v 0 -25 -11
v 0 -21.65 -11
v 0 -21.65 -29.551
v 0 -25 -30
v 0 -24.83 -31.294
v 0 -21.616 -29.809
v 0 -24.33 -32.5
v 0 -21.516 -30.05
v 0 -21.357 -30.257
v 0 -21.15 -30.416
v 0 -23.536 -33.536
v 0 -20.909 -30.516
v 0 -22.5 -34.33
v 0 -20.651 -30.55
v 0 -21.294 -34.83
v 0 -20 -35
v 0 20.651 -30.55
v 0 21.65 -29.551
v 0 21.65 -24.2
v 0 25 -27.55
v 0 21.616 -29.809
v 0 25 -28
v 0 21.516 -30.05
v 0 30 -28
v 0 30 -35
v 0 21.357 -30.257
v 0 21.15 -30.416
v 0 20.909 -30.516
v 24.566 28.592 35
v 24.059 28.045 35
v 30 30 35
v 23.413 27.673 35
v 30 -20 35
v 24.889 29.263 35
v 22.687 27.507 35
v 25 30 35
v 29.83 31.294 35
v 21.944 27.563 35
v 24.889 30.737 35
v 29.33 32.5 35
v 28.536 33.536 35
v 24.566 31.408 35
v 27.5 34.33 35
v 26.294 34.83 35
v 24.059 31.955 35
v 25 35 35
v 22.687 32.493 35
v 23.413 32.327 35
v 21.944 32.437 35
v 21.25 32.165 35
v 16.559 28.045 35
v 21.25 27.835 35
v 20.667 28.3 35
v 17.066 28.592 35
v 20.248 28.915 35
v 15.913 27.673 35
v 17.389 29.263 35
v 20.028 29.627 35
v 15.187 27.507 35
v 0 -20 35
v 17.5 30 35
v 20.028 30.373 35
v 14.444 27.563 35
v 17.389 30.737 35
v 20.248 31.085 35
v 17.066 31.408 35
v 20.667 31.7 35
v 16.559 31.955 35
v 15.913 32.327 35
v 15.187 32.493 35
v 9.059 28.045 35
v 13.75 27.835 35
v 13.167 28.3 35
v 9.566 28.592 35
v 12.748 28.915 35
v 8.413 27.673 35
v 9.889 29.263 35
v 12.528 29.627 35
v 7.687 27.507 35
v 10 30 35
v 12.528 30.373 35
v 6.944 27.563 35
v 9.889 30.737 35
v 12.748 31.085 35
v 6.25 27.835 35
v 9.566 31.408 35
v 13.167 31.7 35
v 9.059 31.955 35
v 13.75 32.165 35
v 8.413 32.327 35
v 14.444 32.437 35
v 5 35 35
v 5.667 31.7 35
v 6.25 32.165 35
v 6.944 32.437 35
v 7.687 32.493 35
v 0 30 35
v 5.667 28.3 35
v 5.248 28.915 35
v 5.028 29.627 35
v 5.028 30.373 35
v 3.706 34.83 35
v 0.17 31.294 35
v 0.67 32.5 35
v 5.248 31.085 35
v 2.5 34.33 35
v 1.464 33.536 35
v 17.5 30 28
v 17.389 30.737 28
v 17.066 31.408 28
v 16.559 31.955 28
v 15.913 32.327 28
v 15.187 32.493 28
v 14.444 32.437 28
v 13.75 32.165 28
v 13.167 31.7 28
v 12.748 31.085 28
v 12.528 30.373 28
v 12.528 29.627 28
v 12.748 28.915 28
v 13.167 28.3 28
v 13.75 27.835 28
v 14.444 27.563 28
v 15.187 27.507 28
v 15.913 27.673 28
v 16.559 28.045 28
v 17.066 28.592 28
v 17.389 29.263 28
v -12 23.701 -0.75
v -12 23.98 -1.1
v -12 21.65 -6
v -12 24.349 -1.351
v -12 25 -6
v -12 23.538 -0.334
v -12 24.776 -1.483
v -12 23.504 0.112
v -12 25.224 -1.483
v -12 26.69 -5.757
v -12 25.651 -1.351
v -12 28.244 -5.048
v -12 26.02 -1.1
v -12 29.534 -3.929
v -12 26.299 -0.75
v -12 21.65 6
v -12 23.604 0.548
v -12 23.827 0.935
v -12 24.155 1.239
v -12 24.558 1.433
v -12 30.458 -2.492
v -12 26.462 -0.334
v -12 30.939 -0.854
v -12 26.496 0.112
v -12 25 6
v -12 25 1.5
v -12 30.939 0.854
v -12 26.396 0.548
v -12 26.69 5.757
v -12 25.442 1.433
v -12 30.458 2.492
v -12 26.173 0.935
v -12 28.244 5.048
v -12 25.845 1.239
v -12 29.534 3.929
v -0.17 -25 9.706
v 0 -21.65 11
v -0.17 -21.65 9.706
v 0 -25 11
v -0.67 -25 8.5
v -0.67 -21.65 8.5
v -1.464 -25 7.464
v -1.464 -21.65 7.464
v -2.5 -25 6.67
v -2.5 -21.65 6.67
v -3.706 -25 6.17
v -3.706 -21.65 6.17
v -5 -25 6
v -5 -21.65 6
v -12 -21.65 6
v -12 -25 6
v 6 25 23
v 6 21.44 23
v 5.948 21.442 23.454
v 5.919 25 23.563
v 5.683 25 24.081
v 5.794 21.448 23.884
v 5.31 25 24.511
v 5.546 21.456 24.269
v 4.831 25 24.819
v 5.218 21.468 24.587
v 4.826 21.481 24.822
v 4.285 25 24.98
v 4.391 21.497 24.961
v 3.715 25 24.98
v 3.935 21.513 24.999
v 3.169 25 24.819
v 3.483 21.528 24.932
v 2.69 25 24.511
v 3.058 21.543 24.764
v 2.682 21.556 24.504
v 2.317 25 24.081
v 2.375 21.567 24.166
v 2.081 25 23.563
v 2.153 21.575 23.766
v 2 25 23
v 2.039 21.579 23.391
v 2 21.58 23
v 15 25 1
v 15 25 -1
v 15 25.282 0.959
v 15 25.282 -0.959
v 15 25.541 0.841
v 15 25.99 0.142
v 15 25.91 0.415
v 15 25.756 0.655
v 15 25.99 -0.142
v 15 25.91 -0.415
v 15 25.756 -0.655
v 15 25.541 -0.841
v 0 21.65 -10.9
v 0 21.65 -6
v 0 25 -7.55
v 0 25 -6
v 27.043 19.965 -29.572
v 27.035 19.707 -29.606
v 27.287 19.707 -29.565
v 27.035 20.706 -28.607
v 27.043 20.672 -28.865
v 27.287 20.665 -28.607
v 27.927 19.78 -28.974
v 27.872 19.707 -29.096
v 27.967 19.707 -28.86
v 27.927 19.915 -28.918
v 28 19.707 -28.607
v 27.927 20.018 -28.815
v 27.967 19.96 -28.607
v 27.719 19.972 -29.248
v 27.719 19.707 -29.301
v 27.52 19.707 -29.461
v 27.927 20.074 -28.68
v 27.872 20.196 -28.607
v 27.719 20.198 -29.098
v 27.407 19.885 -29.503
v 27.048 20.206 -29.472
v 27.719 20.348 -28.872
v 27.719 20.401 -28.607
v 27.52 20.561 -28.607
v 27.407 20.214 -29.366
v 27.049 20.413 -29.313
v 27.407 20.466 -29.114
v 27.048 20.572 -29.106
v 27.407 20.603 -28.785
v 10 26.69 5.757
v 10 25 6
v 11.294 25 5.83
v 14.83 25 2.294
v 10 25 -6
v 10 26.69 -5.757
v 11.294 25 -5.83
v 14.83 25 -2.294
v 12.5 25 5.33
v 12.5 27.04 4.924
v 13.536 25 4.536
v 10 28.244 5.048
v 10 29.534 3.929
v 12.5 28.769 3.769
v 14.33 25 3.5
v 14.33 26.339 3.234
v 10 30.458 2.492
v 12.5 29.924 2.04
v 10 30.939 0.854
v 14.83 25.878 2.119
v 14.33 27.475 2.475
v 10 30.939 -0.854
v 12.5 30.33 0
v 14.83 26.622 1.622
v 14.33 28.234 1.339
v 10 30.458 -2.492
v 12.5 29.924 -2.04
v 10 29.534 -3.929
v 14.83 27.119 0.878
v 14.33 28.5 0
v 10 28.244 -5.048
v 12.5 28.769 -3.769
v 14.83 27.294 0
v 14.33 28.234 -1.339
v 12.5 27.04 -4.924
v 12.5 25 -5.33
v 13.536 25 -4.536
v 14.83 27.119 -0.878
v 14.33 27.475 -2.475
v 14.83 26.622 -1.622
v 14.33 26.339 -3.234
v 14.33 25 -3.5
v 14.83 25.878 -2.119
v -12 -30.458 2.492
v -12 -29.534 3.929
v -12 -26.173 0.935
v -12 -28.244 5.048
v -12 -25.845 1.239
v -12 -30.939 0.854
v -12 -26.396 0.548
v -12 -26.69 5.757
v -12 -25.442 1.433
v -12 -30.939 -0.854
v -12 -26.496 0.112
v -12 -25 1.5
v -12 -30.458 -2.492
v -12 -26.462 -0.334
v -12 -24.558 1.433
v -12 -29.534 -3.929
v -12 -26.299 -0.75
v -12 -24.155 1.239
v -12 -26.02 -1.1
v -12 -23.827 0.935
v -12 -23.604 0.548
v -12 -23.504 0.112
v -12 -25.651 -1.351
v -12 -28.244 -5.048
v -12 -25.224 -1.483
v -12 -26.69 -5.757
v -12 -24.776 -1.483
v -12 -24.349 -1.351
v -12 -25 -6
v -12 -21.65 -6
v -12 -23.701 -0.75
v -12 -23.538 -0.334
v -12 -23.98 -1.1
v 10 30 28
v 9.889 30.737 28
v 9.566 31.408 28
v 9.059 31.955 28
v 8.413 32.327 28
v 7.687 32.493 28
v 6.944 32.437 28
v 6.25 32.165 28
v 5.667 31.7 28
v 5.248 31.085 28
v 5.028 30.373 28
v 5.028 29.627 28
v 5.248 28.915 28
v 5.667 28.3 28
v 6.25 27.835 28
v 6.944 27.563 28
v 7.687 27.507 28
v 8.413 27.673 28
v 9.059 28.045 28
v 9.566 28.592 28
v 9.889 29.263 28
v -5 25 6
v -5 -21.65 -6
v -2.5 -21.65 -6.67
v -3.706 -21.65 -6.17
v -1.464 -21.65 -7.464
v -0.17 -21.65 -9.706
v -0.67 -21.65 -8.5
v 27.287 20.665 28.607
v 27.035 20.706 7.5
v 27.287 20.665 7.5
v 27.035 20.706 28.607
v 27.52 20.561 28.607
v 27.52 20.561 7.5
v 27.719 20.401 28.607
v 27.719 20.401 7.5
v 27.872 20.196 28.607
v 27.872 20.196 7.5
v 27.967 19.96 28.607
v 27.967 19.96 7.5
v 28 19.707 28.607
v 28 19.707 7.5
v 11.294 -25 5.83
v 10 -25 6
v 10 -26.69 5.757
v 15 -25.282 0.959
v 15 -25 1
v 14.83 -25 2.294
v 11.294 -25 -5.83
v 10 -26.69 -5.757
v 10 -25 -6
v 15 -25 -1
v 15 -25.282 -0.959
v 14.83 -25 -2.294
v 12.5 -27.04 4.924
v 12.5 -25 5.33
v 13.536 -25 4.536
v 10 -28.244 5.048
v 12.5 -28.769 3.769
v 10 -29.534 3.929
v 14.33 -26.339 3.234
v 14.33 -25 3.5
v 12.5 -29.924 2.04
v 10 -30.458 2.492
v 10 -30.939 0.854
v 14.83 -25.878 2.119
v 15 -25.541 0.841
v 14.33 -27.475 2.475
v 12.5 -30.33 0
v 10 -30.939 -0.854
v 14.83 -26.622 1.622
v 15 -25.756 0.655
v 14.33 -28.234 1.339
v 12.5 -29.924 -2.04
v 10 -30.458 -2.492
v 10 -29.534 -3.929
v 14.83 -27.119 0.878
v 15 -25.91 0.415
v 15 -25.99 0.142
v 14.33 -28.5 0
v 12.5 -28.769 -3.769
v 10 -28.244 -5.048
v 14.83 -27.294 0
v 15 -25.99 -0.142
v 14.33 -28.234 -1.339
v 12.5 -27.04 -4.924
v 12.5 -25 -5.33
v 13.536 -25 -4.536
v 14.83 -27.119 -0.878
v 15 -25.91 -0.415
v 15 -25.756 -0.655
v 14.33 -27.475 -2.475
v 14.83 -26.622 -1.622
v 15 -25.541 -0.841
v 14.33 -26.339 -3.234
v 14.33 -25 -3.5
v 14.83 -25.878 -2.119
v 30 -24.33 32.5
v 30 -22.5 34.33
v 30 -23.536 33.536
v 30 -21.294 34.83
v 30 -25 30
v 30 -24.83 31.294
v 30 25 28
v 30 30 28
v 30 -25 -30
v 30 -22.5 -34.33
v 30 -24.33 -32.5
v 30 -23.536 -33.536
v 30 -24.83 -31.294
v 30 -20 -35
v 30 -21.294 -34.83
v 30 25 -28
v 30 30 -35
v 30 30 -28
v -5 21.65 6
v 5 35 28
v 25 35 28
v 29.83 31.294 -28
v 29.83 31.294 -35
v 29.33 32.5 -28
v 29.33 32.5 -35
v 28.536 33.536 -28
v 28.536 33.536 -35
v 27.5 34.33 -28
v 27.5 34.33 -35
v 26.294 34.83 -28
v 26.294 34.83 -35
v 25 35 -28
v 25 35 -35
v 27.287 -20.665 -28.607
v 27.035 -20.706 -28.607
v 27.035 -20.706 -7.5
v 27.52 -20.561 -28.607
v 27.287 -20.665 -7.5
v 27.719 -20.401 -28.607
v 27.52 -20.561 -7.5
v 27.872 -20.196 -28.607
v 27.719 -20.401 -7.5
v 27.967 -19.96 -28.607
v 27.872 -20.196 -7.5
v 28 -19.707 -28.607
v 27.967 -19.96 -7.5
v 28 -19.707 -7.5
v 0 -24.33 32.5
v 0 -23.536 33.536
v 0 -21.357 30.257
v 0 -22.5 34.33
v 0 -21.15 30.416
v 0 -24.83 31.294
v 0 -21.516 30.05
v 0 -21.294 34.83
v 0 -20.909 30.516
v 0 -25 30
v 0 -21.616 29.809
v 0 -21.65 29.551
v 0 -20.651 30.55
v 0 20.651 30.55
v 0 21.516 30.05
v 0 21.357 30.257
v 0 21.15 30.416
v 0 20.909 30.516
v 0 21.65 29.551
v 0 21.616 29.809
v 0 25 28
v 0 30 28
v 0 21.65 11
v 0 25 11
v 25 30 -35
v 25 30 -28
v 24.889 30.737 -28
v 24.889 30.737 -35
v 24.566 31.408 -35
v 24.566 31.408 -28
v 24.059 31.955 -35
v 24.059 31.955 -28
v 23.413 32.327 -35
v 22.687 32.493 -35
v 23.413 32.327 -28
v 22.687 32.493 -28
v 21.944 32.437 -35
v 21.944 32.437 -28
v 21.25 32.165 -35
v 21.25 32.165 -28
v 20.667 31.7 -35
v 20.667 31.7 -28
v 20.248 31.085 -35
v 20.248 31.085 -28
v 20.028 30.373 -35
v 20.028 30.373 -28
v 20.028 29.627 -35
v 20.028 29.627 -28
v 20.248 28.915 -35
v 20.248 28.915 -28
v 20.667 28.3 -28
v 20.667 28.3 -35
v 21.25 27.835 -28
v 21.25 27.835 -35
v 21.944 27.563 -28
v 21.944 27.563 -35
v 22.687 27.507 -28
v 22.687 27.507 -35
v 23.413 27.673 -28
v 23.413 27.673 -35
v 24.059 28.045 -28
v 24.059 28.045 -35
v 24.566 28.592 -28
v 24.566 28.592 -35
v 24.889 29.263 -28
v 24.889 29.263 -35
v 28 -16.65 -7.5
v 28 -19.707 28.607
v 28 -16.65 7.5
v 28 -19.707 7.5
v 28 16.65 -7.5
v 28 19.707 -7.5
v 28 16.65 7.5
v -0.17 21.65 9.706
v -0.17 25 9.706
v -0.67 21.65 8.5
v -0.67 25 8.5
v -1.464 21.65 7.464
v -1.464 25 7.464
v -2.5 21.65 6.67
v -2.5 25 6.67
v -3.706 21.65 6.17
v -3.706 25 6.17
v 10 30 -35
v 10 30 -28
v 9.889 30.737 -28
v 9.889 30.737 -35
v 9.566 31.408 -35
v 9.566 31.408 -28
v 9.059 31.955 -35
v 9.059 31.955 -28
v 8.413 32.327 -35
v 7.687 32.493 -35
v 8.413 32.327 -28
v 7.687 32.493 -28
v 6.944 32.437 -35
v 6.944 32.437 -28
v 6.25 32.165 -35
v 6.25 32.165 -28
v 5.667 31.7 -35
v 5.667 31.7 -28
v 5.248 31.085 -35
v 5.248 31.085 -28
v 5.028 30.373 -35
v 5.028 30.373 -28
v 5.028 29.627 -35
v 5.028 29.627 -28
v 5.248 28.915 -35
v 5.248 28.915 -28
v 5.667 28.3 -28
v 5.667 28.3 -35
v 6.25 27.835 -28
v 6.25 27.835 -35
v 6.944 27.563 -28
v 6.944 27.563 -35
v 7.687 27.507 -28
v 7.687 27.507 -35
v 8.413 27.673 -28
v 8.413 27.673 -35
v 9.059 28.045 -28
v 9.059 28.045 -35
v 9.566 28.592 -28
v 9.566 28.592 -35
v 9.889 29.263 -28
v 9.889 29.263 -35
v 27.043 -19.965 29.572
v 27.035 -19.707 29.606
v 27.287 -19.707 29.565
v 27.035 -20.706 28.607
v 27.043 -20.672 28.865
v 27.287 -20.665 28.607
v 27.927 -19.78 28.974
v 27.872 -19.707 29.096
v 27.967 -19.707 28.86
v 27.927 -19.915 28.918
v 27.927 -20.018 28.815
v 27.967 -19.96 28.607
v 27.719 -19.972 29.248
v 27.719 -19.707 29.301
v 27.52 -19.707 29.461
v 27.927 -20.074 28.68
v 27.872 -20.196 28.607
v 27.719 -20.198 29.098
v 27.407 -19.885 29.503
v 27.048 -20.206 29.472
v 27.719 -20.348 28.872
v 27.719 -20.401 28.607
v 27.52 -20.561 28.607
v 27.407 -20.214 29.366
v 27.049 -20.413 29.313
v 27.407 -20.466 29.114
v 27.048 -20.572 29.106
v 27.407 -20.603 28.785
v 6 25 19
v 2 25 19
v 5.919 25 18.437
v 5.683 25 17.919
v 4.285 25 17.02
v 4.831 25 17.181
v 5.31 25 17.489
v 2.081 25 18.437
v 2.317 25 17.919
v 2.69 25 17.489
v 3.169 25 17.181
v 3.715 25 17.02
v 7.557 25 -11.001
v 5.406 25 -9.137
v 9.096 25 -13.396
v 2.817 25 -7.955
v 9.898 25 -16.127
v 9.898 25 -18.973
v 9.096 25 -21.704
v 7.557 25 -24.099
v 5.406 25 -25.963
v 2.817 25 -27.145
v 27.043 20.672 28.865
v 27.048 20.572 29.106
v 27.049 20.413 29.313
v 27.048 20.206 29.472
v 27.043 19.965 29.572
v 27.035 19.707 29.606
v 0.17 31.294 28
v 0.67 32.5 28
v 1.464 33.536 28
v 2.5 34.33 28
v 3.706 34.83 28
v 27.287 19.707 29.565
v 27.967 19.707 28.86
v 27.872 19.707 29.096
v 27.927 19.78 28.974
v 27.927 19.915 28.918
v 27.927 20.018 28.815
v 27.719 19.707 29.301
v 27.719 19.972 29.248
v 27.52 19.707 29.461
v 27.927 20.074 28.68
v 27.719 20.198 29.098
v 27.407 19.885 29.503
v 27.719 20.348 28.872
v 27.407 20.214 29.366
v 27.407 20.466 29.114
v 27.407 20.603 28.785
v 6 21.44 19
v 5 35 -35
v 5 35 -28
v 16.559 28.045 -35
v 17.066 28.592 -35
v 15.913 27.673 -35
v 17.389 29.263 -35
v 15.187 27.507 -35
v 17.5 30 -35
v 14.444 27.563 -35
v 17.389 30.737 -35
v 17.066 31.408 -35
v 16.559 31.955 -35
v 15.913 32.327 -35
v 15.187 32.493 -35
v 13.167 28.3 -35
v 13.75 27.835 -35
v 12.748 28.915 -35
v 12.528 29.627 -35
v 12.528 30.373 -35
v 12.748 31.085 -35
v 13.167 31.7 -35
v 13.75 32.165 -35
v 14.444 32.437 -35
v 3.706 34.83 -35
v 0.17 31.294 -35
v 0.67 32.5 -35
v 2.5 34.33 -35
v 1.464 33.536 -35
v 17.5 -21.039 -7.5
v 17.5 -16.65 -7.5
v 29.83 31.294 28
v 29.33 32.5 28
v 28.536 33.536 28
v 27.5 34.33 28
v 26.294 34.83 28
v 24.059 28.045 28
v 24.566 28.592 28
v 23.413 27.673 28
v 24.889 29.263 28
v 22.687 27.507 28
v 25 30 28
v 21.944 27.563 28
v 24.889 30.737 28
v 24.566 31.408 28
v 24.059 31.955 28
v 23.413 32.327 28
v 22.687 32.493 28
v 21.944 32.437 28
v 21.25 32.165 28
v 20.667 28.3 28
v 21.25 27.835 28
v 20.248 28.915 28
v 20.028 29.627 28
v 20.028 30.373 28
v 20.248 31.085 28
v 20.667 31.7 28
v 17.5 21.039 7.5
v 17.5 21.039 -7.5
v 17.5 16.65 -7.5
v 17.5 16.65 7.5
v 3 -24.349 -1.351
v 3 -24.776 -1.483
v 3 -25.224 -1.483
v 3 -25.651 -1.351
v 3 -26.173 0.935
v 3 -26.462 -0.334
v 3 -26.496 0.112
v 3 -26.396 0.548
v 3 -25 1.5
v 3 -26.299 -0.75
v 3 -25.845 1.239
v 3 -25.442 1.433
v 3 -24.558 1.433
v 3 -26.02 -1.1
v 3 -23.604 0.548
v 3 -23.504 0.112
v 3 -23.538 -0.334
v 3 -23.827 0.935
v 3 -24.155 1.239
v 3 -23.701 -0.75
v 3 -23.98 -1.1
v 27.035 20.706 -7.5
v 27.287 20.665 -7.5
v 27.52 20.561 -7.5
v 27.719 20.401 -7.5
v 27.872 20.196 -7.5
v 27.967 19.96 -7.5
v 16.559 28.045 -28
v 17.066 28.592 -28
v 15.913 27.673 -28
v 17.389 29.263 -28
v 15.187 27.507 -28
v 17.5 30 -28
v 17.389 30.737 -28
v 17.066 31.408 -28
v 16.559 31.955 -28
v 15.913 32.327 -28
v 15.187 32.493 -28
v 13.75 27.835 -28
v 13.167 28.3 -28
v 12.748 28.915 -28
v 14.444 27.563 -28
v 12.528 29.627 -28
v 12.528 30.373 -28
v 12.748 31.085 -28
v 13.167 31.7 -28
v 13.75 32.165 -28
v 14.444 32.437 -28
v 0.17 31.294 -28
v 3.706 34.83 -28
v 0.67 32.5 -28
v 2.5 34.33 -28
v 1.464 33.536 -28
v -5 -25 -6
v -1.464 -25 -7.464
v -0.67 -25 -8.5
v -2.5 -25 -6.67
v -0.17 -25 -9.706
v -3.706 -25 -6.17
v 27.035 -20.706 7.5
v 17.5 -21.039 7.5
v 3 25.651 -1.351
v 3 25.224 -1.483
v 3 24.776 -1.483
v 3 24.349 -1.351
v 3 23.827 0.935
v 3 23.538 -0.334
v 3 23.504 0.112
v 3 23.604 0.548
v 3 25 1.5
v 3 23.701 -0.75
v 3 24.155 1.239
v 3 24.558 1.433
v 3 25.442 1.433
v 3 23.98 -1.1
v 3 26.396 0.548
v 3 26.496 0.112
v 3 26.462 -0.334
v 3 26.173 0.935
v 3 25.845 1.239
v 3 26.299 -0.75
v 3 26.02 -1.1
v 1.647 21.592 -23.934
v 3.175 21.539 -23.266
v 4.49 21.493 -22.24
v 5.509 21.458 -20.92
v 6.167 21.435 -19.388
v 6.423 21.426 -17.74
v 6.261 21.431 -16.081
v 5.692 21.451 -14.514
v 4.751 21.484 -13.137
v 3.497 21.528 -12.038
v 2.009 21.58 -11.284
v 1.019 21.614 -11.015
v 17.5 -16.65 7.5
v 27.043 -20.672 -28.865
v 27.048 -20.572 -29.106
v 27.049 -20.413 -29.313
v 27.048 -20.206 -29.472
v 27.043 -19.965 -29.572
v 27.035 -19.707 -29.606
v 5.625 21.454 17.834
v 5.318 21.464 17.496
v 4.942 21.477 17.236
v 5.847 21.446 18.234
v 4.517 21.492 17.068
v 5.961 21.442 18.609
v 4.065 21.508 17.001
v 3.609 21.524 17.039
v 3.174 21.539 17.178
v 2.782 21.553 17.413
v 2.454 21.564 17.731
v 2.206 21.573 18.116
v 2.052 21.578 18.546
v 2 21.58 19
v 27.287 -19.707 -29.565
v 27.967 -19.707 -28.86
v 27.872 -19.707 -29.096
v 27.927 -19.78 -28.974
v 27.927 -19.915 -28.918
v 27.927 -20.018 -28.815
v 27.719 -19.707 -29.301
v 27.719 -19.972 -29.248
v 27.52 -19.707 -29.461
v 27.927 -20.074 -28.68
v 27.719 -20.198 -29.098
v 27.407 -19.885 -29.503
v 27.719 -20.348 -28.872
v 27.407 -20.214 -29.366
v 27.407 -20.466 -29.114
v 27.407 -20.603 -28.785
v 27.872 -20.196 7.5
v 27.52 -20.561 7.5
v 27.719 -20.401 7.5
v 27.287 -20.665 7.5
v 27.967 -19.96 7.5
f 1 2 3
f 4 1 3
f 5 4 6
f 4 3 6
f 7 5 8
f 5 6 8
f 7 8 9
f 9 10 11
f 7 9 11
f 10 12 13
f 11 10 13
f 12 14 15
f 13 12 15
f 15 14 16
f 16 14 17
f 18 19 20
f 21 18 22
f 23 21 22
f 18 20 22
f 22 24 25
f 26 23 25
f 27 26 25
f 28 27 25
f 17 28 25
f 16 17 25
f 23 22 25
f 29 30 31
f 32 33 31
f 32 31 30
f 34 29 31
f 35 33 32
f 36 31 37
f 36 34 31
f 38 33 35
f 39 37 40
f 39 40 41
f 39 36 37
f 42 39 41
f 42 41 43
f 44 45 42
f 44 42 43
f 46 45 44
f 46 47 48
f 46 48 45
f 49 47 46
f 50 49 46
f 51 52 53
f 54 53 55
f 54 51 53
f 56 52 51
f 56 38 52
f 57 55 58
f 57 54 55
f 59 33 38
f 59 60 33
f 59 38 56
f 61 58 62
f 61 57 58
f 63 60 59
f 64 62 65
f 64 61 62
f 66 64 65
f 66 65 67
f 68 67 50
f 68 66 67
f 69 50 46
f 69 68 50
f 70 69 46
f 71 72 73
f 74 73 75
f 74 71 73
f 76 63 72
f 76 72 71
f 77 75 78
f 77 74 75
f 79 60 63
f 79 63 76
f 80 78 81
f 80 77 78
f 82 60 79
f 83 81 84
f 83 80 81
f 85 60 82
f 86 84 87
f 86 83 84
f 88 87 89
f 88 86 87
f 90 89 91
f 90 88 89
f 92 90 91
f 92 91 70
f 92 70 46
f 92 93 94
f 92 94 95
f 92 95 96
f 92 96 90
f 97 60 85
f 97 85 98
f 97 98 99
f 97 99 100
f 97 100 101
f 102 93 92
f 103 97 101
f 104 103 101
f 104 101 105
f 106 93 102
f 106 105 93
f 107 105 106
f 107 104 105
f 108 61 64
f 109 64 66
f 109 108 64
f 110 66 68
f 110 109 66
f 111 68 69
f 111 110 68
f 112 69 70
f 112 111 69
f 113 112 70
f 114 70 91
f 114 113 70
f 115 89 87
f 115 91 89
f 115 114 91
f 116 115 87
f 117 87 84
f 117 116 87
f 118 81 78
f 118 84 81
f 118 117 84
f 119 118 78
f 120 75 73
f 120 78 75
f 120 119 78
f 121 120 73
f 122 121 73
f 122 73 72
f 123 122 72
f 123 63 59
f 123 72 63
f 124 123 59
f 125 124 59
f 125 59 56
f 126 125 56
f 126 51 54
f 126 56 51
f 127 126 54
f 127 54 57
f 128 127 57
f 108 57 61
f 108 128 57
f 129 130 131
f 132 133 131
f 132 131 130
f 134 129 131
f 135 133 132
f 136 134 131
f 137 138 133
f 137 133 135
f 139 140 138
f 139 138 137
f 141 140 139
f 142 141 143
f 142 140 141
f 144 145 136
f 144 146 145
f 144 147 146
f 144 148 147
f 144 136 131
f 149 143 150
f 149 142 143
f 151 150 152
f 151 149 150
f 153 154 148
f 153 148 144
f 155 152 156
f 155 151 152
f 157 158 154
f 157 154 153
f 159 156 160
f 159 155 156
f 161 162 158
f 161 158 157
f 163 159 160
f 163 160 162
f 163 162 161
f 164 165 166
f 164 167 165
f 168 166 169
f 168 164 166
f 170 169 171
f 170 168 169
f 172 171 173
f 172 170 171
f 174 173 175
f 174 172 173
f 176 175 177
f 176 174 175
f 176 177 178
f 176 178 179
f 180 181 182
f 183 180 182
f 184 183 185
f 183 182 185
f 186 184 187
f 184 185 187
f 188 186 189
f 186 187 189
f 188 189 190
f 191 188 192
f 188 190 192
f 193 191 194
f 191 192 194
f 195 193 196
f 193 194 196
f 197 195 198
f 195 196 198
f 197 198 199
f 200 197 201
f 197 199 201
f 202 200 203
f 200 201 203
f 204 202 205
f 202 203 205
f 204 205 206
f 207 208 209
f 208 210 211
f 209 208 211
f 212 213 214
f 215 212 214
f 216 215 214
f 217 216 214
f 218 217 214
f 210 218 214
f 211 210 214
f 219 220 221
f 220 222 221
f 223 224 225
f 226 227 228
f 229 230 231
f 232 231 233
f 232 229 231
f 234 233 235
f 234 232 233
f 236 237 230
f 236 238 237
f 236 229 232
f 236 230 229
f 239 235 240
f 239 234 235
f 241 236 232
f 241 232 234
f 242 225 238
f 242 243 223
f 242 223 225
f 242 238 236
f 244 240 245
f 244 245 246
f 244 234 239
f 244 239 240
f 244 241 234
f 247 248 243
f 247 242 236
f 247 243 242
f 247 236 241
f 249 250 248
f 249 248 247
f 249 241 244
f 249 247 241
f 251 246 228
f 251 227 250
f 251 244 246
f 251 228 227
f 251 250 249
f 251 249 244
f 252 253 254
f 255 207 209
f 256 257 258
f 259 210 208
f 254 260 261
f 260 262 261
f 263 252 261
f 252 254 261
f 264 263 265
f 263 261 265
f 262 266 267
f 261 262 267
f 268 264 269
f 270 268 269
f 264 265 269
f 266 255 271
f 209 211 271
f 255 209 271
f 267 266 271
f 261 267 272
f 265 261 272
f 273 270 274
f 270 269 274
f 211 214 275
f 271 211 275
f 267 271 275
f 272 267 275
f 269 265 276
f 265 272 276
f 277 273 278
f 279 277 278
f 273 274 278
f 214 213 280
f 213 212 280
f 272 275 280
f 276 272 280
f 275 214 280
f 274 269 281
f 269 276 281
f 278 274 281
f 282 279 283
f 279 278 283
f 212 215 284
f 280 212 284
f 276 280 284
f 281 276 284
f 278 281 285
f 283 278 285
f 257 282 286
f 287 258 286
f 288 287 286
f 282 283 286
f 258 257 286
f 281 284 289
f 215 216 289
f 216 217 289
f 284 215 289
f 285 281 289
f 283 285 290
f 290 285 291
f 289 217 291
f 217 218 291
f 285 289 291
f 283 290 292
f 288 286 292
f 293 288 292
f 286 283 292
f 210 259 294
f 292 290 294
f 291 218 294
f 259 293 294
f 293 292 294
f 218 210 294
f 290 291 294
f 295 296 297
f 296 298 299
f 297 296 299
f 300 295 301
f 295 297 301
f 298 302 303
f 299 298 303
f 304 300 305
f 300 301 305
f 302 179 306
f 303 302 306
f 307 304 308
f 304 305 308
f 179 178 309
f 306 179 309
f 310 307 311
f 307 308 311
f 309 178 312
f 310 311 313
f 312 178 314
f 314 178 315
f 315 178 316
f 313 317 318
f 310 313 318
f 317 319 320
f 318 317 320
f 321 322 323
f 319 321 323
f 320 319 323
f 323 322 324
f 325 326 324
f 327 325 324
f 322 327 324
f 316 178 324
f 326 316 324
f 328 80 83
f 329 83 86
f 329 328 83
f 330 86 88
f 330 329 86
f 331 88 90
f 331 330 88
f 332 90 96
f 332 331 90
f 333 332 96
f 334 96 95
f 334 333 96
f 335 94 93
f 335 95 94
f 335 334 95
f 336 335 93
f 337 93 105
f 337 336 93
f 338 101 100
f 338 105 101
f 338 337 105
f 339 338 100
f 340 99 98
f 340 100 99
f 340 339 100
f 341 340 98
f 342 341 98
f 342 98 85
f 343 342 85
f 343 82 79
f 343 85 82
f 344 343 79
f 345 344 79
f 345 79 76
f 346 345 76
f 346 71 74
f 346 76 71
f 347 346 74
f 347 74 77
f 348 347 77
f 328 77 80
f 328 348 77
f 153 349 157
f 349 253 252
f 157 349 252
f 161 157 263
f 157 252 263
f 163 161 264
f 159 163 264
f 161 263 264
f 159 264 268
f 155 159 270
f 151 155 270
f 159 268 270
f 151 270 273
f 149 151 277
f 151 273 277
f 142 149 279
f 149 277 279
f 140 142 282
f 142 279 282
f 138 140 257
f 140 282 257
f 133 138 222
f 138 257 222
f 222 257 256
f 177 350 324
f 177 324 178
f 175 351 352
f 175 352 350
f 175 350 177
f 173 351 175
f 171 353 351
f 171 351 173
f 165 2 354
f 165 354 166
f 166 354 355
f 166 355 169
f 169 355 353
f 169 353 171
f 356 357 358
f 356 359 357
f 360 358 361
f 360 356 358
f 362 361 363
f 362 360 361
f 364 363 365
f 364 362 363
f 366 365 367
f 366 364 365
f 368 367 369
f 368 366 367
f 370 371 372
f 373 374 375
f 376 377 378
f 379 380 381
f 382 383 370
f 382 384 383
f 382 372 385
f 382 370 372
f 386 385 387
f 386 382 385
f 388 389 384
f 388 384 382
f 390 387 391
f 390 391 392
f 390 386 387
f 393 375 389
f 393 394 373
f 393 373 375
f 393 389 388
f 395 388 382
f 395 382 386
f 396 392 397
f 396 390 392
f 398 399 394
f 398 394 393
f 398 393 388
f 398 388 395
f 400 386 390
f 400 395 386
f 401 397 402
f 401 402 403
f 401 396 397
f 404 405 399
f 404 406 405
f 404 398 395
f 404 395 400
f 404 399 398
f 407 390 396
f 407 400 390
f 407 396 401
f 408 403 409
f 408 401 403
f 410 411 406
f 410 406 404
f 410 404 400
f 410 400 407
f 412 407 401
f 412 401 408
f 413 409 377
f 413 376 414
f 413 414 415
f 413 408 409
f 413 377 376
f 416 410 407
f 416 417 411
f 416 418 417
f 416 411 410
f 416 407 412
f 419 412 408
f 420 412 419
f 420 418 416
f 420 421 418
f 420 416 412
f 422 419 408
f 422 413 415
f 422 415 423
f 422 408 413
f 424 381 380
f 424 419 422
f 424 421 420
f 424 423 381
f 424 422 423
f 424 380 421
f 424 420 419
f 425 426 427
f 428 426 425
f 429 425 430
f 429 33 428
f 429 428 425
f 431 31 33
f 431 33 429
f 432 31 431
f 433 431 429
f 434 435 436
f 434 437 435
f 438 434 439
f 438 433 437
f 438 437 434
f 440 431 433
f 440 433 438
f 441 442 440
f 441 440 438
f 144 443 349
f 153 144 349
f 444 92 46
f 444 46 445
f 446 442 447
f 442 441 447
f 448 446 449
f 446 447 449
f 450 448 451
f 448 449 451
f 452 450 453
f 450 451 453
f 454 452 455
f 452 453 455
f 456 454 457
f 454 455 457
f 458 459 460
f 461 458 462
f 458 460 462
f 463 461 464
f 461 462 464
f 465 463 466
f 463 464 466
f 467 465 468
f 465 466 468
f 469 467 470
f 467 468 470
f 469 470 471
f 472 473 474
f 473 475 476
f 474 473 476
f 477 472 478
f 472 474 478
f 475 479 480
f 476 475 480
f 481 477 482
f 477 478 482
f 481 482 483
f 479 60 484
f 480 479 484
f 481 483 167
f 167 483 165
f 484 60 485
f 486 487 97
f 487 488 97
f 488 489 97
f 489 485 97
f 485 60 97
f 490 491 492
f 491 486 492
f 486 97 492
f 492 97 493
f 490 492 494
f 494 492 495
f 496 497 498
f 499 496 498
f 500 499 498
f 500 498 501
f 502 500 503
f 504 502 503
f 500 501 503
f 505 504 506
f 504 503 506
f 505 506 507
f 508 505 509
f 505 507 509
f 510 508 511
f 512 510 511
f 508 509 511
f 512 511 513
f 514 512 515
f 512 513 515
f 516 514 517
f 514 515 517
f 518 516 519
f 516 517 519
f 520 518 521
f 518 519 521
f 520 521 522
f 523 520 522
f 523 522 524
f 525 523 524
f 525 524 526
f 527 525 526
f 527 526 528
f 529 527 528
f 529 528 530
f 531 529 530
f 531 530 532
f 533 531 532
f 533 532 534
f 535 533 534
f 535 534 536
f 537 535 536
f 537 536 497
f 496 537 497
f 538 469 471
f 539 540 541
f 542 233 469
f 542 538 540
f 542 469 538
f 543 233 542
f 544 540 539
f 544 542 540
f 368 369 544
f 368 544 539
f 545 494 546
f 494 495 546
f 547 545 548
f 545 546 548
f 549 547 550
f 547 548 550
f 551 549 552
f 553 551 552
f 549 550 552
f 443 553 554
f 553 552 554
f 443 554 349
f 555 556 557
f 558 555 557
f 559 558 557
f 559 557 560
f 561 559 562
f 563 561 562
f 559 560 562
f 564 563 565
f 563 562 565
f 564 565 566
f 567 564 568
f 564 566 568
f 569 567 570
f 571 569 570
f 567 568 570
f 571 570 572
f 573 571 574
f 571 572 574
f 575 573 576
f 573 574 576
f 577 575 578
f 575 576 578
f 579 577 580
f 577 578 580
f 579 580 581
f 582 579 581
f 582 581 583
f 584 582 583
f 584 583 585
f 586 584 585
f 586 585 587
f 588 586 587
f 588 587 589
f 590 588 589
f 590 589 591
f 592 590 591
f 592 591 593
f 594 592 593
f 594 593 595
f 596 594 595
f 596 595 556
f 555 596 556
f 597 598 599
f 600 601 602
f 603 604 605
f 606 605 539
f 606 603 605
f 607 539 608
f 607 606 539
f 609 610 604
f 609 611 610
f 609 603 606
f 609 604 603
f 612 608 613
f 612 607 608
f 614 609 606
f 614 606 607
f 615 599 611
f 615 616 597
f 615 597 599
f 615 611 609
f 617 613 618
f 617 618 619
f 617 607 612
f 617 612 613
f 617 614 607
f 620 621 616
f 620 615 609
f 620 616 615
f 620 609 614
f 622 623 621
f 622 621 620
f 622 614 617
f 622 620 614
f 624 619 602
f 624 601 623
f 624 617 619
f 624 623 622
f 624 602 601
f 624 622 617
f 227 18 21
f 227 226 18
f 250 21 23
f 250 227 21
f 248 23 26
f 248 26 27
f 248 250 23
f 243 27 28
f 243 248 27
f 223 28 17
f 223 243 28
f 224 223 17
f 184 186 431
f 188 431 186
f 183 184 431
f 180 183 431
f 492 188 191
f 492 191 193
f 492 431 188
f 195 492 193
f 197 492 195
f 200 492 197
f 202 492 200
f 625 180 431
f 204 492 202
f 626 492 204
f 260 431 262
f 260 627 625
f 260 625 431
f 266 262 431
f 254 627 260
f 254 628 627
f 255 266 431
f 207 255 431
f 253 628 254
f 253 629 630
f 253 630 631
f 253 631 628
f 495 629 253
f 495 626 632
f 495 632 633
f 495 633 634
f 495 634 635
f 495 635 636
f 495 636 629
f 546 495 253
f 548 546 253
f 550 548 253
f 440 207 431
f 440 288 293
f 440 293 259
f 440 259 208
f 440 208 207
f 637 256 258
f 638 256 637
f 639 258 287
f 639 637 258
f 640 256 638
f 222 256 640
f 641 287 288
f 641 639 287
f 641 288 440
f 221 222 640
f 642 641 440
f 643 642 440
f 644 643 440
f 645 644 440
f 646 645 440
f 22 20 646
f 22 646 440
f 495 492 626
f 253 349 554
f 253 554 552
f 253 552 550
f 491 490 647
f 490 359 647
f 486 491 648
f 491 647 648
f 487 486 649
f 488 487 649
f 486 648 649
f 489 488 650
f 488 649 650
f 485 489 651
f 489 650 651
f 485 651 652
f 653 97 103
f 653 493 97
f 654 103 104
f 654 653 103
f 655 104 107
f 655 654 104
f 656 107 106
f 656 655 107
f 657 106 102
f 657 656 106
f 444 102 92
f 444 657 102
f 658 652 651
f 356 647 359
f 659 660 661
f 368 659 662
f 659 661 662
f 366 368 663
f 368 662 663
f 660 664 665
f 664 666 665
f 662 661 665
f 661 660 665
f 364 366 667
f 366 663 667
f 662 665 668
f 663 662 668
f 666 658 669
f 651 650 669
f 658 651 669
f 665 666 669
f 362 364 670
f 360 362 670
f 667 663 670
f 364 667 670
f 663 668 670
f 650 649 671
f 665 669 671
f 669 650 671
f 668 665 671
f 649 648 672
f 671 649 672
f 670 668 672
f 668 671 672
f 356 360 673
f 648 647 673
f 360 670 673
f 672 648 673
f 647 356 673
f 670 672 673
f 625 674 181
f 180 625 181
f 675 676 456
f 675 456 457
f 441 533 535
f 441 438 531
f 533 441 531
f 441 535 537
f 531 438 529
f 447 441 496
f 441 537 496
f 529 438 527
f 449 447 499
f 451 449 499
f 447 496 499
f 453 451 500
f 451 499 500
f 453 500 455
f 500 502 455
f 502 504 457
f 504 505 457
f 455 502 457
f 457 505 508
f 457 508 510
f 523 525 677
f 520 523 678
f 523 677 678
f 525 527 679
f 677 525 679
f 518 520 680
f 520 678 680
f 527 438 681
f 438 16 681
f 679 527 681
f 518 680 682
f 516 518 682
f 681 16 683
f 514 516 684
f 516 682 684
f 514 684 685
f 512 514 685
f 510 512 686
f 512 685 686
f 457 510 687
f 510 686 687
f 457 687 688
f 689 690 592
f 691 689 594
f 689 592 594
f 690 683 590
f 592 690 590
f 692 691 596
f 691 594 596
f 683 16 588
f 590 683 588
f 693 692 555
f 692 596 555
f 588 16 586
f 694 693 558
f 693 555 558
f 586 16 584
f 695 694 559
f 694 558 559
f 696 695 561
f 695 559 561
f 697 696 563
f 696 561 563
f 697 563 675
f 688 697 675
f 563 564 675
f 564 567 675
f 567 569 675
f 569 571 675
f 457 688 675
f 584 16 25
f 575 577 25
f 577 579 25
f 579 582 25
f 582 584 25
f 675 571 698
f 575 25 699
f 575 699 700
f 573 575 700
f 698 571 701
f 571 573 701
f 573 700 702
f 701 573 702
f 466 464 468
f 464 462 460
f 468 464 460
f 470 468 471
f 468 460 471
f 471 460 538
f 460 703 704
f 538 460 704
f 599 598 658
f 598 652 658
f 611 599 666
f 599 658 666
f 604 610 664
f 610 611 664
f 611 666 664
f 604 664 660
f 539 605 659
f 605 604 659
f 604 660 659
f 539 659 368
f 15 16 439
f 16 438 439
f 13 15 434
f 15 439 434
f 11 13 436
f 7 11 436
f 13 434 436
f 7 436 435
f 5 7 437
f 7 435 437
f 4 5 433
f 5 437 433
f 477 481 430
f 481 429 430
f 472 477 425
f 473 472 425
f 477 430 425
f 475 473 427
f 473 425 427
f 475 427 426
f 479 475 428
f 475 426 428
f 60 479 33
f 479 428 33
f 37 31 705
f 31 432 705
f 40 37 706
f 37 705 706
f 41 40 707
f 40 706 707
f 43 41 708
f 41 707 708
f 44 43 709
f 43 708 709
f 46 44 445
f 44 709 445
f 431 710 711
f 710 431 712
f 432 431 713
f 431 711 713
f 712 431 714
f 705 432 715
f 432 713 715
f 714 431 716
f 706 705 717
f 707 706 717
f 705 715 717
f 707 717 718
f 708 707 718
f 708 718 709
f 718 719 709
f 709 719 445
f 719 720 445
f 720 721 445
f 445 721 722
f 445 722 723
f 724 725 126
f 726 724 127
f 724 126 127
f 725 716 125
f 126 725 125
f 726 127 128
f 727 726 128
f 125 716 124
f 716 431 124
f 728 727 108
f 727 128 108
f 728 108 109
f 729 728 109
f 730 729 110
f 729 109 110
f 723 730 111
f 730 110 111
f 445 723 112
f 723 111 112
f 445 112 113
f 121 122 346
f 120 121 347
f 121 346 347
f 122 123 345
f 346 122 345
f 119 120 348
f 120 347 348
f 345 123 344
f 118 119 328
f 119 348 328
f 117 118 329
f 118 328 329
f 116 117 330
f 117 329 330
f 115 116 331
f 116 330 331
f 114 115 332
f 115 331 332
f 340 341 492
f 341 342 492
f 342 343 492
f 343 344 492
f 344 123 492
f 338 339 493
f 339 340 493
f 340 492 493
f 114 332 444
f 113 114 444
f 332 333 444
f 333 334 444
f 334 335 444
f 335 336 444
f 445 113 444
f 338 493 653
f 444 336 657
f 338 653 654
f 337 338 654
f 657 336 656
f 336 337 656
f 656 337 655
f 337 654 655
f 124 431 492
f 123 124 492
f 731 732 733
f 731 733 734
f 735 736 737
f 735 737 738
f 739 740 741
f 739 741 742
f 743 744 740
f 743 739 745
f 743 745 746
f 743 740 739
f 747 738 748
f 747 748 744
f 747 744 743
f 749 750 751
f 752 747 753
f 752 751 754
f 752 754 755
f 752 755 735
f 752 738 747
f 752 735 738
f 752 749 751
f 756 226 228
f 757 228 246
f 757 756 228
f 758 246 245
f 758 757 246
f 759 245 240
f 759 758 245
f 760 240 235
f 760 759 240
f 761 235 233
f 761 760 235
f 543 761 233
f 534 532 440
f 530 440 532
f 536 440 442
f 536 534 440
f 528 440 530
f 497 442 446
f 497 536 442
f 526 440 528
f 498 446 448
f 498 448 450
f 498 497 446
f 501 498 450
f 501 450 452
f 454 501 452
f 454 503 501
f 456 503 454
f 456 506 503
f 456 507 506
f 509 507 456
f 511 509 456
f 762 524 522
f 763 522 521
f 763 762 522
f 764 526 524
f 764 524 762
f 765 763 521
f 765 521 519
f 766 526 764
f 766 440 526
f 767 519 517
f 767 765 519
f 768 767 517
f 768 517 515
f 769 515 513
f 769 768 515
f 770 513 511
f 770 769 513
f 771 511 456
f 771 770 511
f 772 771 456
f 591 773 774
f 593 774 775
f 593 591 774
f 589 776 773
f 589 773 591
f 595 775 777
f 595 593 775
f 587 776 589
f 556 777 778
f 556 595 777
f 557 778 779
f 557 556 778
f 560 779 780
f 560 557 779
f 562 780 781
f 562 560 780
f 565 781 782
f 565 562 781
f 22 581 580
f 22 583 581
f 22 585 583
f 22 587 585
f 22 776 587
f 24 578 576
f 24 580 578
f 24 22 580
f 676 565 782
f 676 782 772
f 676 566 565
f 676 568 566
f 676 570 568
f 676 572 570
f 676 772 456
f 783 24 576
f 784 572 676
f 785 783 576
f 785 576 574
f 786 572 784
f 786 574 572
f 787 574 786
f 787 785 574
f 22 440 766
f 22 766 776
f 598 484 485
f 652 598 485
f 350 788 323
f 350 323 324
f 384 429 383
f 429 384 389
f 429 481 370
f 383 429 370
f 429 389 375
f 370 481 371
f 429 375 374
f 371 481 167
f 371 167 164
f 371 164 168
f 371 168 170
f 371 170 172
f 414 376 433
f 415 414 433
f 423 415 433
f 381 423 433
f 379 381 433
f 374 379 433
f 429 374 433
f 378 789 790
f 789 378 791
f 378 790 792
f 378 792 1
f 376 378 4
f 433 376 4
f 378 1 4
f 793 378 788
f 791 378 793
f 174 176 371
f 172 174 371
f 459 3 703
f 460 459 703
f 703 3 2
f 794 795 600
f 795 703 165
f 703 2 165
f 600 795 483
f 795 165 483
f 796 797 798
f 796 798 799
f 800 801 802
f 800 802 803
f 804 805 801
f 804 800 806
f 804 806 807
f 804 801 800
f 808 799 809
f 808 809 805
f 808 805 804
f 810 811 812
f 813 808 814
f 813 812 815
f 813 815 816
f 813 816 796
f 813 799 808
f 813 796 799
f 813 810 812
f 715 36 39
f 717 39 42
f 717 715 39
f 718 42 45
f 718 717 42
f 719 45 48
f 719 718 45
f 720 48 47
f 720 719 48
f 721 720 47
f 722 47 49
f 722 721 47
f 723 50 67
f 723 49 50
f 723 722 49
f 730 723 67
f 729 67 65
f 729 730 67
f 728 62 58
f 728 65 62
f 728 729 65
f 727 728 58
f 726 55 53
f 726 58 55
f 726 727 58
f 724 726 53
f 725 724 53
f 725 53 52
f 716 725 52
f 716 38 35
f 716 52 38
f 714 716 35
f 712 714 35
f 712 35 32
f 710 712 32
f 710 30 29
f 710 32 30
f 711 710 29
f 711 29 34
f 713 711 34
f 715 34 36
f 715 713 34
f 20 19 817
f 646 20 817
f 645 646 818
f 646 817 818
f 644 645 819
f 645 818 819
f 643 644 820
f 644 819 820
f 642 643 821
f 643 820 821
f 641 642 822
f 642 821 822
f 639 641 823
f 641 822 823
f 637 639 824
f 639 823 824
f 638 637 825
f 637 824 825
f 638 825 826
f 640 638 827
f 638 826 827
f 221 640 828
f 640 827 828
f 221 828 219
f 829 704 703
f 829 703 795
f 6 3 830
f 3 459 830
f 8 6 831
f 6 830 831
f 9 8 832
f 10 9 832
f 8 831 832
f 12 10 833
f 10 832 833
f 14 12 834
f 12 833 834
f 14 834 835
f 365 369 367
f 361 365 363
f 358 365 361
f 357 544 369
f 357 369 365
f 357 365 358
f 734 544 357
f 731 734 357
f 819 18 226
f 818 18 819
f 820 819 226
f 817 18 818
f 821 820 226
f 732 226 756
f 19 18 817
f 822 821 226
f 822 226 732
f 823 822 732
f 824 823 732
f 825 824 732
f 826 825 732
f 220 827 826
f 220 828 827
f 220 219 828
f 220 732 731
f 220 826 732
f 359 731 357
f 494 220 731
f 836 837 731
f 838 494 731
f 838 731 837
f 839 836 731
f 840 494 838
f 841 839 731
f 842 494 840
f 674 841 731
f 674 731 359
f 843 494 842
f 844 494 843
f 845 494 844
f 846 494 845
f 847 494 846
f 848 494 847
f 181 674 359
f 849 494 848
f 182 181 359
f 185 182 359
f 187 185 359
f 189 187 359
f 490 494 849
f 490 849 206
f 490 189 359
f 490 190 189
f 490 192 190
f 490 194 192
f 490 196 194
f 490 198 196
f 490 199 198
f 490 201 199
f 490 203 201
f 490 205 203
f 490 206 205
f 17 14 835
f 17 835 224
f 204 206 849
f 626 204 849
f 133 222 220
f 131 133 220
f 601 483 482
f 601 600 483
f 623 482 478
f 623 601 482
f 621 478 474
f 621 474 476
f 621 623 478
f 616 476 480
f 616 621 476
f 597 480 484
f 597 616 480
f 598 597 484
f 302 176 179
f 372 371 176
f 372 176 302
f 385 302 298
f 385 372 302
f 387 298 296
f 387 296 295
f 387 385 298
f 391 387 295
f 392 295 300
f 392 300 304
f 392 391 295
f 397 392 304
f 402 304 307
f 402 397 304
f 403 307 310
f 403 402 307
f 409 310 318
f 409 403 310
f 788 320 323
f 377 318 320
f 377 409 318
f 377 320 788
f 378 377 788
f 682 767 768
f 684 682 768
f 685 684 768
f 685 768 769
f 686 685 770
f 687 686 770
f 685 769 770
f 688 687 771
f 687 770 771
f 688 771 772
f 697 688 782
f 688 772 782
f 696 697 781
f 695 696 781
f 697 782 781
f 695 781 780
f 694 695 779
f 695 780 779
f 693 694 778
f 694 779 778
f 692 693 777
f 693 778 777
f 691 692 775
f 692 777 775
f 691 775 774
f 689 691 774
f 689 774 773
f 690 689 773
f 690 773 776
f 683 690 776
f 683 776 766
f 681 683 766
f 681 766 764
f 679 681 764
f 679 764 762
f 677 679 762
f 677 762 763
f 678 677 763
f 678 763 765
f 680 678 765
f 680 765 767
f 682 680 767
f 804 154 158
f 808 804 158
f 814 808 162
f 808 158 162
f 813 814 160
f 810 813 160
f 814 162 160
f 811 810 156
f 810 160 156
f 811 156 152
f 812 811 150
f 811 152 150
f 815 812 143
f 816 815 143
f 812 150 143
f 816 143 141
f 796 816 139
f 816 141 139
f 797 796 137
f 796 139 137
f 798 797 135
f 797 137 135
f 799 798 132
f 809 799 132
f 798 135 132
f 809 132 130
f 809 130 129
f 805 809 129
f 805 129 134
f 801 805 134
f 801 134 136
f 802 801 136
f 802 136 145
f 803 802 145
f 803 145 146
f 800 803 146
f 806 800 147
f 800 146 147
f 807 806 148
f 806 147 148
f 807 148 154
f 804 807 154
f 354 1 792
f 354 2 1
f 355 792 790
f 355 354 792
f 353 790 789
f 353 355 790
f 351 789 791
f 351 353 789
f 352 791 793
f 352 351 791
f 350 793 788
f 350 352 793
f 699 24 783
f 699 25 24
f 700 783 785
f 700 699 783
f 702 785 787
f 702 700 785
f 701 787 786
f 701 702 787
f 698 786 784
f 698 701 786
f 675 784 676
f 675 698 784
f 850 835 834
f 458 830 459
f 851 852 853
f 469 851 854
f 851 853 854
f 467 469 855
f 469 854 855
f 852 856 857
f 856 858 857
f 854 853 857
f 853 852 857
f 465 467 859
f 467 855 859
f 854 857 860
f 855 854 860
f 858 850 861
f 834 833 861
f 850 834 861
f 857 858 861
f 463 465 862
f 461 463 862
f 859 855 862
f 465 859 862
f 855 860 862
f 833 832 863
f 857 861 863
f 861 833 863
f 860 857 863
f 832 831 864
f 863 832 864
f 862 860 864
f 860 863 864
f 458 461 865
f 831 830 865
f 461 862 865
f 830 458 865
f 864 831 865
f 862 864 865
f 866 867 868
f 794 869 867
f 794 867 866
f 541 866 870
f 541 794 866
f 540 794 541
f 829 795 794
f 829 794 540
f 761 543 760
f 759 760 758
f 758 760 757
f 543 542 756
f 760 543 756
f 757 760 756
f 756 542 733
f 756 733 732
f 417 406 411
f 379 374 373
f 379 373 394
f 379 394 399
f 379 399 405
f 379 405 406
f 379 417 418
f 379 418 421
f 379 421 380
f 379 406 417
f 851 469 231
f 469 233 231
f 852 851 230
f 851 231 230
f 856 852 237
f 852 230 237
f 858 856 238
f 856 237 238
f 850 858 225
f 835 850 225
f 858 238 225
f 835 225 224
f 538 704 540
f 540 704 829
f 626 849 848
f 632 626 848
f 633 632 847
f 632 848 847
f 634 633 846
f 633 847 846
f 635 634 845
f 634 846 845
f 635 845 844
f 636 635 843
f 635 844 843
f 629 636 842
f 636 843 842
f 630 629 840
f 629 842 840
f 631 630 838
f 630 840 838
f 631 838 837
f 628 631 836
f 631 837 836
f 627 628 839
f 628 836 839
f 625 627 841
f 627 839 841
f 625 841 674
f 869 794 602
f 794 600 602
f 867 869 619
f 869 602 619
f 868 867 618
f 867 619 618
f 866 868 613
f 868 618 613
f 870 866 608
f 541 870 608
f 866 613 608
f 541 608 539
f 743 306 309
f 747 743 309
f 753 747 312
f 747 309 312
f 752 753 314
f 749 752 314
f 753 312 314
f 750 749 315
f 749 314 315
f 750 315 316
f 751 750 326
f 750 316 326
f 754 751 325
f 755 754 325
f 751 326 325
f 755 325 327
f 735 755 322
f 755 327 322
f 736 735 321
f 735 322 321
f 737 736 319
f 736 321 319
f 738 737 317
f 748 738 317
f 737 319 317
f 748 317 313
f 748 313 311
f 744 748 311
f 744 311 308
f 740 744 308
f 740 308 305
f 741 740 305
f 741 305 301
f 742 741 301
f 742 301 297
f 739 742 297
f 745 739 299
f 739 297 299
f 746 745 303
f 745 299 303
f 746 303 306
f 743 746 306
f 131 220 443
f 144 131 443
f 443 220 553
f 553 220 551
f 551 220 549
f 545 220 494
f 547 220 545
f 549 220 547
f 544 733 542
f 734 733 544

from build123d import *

# Parameters (mm, degrees)
SKETCH1_W                = 70
SKETCH1_H                = 50
BOSS_EXTRUDE1_DEPTH      = 30
SKETCH2_W                = 61.1
SKETCH2_H                = 43.3
CUT_EXTRUDE1_DEPTH       = 28
CUT_EXTRUDE1_DRAFT       = -2
SKETCH3_W                = 7
SKETCH3_H                = 13.35
HANG_TABS_DEPTH          = 30
BOSS_EXTRUDE3_DEPTH      = 12
BOSS_EXTRUDE3_DEPTH_BACK = 15
SKETCH5_R                = 1.5
CUT_EXTRUDE2_DEPTH       = 15
SKETCH6_R                = 5
CUT_EXTRUDE3_DEPTH       = 58.879184514
CUT_EXTRUDE4_DEPTH       = 58.879184514
CUT_EXTRUDE5_START       = -28
SKETCH8_R                = 2.5
CUT_EXTRUDE5_DEPTH       = 30.879184514
CUT_EXTRUDE6_START       = 28
SKETCH8_2_R              = 2.5
CUT_EXTRUDE6_DEPTH       = 30.879184514
FILLET2_R                = 5
FILLET3_R                = 5
CHAMFER1_SIZE            = 5
FILLET4_R                = 5
BOSS_EXTRUDE4_START      = -17.5
SKETCH9_W                = 15
SKETCH9_H                = 5
BOSS_EXTRUDE4_DEPTH      = 10.5
FILLET5_R                = 5
FILLET6_R                = 1


with BuildPart() as part:
    # Sketch1 → Boss-Extrude1 (new body)
    with BuildSketch(Plane(origin=(0, 0, 0), x_dir=(0, 0, -1), z_dir=(1, 0, 0))):
        Rectangle(SKETCH1_W, SKETCH1_H)
    extrude(amount=BOSS_EXTRUDE1_DEPTH)


with BuildPart() as cut_extrude1_tool:
    # Sketch2 → Cut-Extrude1 (with draft: the straight prism first)
    with BuildSketch(Plane.ZY):
        Rectangle(SKETCH2_W, SKETCH2_H)
    extrude(amount=-CUT_EXTRUDE1_DEPTH)
    # Cut-Extrude1: the draft: its side faces are tilted about the plane it starts from
    cut_extrude1_sides = [cut_extrude1_tool.faces().sort_by_distance(p)[0] for p in [
        (14, -21.65, 0),
        (14, 0, 30.55),
        (14, 21.65, 0),
        (14, 0, -30.55),
    ]]
    draft(cut_extrude1_sides, Plane.ZY, CUT_EXTRUDE1_DRAFT)


with BuildPart() as part_1:
    add(part.part)

    # Cut-Extrude1: cut by cut_extrude1_tool
    add(cut_extrude1_tool.part, mode=Mode.SUBTRACT)

    # Sketch3 → Hang tabs (add)
    with BuildSketch(Plane(origin=(0, 0, 0), x_dir=(0, 0, -1), z_dir=(1, 0, 0))):
        with Locations((-31.5, 28.325)):
            Rectangle(SKETCH3_W, SKETCH3_H)
        with Locations((31.5, 28.325)):
            Rectangle(SKETCH3_W, SKETCH3_H)
    extrude(amount=HANG_TABS_DEPTH)

    # Sketch4 → Boss-Extrude3 (add, two sides: drawn at the far end of the back side and taken through both)
    with BuildSketch(Plane.ZY.offset(-BOSS_EXTRUDE3_DEPTH_BACK)):
        with BuildLine():
            Line((-6, 25), (-6, 21.65))
            Line((-6, 21.65), (6, 21.65))
            Line((6, 21.65), (6, 25))
            ThreePointArc((6, 25), (0, 31), (-6, 25))
        make_face()
        with BuildLine():
            Line((-6, -21.65), (6, -21.65))
            Line((6, -21.65), (6, -25))
            ThreePointArc((6, -25), (0, -31), (-6, -25))
            Line((-6, -25), (-6, -21.65))
        make_face()
    extrude(amount=BOSS_EXTRUDE3_DEPTH + BOSS_EXTRUDE3_DEPTH_BACK)

    # Sketch5 → Cut-Extrude2 (cut)
    with BuildSketch(Plane.ZY.offset(12)):
        with Locations((0, 25)):
            Circle(SKETCH5_R)
        with Locations((0, -25)):
            Circle(SKETCH5_R)
    extrude(amount=-CUT_EXTRUDE2_DEPTH, mode=Mode.SUBTRACT)

    # Sketch6 → Cut-Extrude3 (cut, through all)
    with BuildSketch(Plane(origin=(0, 0, 0), x_dir=(1, 0, 0), z_dir=(0, 1, 0))):
        with Locations((0, 17.55)):
            Circle(SKETCH6_R)
    extrude(amount=CUT_EXTRUDE3_DEPTH, mode=Mode.SUBTRACT)

    # Sketch7 → Cut-Extrude4 (cut, through all)
    with BuildSketch(Plane(origin=(0, 0, 0), x_dir=(1, 0, 0), z_dir=(0, 1, 0))):
        with BuildLine():
            Line((6, -19), (6, -23))
            ThreePointArc((6, -23), (4, -25), (2, -23))
            Line((2, -23), (2, -19))
            ThreePointArc((2, -19), (4, -17), (6, -19))
        make_face()
    extrude(amount=CUT_EXTRUDE4_DEPTH, mode=Mode.SUBTRACT)

    # Sketch8 → Cut-Extrude5 (cut, through all)
    with BuildSketch(Plane.XY.offset(CUT_EXTRUDE5_START)):
        with Locations((15, 30)):
            Circle(SKETCH8_R)
        with Locations((22.5, 30)):
            Circle(SKETCH8_R)
        with Locations((7.5, 30)):
            Circle(SKETCH8_R)
    extrude(amount=-CUT_EXTRUDE5_DEPTH, mode=Mode.SUBTRACT)

    # Sketch8<2> → Cut-Extrude6 (cut, through all)
    with BuildSketch(Plane.XY.offset(CUT_EXTRUDE6_START)):
        with Locations((15, 30)):
            Circle(SKETCH8_2_R)
        with Locations((22.5, 30)):
            Circle(SKETCH8_2_R)
        with Locations((7.5, 30)):
            Circle(SKETCH8_2_R)
    extrude(amount=CUT_EXTRUDE6_DEPTH, mode=Mode.SUBTRACT)

    # Fillet2
    fillet2_edges = [part_1.edges().sort_by_distance(p)[0] for p in [
        (30, 35, 31.5),
        (0, 35, 31.5),
        (30, 35, -31.5),
        (0, 35, -31.5),
    ]]
    fillet(fillet2_edges, radius=FILLET2_R)

    # Fillet3
    fillet3_edges = [part_1.edges().sort_by_distance(p)[0] for p in [
        (15, 31, 0),
        (15, -31, 0),
    ]]
    fillet(fillet3_edges, radius=FILLET3_R)

    # Chamfer1
    # the kernel refuses this chamfer: 5 mm, written as the material it takes off along each edge
    with BuildSketch(Plane(origin=(0, 25, -17.55), x_dir=(-0.9999950652018581, 0, -0.003141587485879425), z_dir=(-0.003141587485879425, 0, 0.9999950652018581))) as chamfer1_piece_1:
        Polygon((5 + CHAMFER1_SIZE, 0), (5, CHAMFER1_SIZE), (5, 0), align=None)
    revolve(axis=Axis((0, 25, -17.55), (0, -1, 0)), revolution_arc=359.64, mode=Mode.SUBTRACT)

    # Fillet4
    fillet4_edges = [part_1.edges().sort_by_distance(p)[0] for p in [
        (15, -25, -35),
        (15, -25, 35),
    ]]
    fillet(fillet4_edges, radius=FILLET4_R)

    # Sketch9 → Boss-Extrude4 (add)
    with BuildSketch(Plane.ZY.offset(BOSS_EXTRUDE4_START)):
        with Locations((0, 19.15)):
            Rectangle(SKETCH9_W, SKETCH9_H)
        with Locations((0, -19.15)):
            Rectangle(SKETCH9_W, SKETCH9_H)
    extrude(amount=-BOSS_EXTRUDE4_DEPTH)

    # Fillet5
    fillet5_edges = [part_1.edges().sort_by_distance(p)[0] for p in [
        (0, 23.325, 6),
        (0, -23.325, 6),
        (0, -23.325, -6),
    ]]
    fillet(fillet5_edges, radius=FILLET5_R)

    # Fillet6
    fillet6_edges = [part_1.edges().sort_by_distance(p)[0] for p in [
        (14, 21.161109227, 30.061109227),
        (14, -21.161109227, 30.061109227),
        (14, -21.161109227, -30.061109227),
        (14, 21.161109227, -30.061109227),
        (28, 0, 29.572218454),
        (28, -20.672218454, 18.536109227),
        (28, 0, -29.572218454),
        (28, 20.672218454, -18.536109227),
        (28, 20.672218454, 18.536109227),
        (28, -20.672218454, -18.536109227),
    ]]
    fillet(fillet6_edges, radius=FILLET6_R)


solid = part_1.part
